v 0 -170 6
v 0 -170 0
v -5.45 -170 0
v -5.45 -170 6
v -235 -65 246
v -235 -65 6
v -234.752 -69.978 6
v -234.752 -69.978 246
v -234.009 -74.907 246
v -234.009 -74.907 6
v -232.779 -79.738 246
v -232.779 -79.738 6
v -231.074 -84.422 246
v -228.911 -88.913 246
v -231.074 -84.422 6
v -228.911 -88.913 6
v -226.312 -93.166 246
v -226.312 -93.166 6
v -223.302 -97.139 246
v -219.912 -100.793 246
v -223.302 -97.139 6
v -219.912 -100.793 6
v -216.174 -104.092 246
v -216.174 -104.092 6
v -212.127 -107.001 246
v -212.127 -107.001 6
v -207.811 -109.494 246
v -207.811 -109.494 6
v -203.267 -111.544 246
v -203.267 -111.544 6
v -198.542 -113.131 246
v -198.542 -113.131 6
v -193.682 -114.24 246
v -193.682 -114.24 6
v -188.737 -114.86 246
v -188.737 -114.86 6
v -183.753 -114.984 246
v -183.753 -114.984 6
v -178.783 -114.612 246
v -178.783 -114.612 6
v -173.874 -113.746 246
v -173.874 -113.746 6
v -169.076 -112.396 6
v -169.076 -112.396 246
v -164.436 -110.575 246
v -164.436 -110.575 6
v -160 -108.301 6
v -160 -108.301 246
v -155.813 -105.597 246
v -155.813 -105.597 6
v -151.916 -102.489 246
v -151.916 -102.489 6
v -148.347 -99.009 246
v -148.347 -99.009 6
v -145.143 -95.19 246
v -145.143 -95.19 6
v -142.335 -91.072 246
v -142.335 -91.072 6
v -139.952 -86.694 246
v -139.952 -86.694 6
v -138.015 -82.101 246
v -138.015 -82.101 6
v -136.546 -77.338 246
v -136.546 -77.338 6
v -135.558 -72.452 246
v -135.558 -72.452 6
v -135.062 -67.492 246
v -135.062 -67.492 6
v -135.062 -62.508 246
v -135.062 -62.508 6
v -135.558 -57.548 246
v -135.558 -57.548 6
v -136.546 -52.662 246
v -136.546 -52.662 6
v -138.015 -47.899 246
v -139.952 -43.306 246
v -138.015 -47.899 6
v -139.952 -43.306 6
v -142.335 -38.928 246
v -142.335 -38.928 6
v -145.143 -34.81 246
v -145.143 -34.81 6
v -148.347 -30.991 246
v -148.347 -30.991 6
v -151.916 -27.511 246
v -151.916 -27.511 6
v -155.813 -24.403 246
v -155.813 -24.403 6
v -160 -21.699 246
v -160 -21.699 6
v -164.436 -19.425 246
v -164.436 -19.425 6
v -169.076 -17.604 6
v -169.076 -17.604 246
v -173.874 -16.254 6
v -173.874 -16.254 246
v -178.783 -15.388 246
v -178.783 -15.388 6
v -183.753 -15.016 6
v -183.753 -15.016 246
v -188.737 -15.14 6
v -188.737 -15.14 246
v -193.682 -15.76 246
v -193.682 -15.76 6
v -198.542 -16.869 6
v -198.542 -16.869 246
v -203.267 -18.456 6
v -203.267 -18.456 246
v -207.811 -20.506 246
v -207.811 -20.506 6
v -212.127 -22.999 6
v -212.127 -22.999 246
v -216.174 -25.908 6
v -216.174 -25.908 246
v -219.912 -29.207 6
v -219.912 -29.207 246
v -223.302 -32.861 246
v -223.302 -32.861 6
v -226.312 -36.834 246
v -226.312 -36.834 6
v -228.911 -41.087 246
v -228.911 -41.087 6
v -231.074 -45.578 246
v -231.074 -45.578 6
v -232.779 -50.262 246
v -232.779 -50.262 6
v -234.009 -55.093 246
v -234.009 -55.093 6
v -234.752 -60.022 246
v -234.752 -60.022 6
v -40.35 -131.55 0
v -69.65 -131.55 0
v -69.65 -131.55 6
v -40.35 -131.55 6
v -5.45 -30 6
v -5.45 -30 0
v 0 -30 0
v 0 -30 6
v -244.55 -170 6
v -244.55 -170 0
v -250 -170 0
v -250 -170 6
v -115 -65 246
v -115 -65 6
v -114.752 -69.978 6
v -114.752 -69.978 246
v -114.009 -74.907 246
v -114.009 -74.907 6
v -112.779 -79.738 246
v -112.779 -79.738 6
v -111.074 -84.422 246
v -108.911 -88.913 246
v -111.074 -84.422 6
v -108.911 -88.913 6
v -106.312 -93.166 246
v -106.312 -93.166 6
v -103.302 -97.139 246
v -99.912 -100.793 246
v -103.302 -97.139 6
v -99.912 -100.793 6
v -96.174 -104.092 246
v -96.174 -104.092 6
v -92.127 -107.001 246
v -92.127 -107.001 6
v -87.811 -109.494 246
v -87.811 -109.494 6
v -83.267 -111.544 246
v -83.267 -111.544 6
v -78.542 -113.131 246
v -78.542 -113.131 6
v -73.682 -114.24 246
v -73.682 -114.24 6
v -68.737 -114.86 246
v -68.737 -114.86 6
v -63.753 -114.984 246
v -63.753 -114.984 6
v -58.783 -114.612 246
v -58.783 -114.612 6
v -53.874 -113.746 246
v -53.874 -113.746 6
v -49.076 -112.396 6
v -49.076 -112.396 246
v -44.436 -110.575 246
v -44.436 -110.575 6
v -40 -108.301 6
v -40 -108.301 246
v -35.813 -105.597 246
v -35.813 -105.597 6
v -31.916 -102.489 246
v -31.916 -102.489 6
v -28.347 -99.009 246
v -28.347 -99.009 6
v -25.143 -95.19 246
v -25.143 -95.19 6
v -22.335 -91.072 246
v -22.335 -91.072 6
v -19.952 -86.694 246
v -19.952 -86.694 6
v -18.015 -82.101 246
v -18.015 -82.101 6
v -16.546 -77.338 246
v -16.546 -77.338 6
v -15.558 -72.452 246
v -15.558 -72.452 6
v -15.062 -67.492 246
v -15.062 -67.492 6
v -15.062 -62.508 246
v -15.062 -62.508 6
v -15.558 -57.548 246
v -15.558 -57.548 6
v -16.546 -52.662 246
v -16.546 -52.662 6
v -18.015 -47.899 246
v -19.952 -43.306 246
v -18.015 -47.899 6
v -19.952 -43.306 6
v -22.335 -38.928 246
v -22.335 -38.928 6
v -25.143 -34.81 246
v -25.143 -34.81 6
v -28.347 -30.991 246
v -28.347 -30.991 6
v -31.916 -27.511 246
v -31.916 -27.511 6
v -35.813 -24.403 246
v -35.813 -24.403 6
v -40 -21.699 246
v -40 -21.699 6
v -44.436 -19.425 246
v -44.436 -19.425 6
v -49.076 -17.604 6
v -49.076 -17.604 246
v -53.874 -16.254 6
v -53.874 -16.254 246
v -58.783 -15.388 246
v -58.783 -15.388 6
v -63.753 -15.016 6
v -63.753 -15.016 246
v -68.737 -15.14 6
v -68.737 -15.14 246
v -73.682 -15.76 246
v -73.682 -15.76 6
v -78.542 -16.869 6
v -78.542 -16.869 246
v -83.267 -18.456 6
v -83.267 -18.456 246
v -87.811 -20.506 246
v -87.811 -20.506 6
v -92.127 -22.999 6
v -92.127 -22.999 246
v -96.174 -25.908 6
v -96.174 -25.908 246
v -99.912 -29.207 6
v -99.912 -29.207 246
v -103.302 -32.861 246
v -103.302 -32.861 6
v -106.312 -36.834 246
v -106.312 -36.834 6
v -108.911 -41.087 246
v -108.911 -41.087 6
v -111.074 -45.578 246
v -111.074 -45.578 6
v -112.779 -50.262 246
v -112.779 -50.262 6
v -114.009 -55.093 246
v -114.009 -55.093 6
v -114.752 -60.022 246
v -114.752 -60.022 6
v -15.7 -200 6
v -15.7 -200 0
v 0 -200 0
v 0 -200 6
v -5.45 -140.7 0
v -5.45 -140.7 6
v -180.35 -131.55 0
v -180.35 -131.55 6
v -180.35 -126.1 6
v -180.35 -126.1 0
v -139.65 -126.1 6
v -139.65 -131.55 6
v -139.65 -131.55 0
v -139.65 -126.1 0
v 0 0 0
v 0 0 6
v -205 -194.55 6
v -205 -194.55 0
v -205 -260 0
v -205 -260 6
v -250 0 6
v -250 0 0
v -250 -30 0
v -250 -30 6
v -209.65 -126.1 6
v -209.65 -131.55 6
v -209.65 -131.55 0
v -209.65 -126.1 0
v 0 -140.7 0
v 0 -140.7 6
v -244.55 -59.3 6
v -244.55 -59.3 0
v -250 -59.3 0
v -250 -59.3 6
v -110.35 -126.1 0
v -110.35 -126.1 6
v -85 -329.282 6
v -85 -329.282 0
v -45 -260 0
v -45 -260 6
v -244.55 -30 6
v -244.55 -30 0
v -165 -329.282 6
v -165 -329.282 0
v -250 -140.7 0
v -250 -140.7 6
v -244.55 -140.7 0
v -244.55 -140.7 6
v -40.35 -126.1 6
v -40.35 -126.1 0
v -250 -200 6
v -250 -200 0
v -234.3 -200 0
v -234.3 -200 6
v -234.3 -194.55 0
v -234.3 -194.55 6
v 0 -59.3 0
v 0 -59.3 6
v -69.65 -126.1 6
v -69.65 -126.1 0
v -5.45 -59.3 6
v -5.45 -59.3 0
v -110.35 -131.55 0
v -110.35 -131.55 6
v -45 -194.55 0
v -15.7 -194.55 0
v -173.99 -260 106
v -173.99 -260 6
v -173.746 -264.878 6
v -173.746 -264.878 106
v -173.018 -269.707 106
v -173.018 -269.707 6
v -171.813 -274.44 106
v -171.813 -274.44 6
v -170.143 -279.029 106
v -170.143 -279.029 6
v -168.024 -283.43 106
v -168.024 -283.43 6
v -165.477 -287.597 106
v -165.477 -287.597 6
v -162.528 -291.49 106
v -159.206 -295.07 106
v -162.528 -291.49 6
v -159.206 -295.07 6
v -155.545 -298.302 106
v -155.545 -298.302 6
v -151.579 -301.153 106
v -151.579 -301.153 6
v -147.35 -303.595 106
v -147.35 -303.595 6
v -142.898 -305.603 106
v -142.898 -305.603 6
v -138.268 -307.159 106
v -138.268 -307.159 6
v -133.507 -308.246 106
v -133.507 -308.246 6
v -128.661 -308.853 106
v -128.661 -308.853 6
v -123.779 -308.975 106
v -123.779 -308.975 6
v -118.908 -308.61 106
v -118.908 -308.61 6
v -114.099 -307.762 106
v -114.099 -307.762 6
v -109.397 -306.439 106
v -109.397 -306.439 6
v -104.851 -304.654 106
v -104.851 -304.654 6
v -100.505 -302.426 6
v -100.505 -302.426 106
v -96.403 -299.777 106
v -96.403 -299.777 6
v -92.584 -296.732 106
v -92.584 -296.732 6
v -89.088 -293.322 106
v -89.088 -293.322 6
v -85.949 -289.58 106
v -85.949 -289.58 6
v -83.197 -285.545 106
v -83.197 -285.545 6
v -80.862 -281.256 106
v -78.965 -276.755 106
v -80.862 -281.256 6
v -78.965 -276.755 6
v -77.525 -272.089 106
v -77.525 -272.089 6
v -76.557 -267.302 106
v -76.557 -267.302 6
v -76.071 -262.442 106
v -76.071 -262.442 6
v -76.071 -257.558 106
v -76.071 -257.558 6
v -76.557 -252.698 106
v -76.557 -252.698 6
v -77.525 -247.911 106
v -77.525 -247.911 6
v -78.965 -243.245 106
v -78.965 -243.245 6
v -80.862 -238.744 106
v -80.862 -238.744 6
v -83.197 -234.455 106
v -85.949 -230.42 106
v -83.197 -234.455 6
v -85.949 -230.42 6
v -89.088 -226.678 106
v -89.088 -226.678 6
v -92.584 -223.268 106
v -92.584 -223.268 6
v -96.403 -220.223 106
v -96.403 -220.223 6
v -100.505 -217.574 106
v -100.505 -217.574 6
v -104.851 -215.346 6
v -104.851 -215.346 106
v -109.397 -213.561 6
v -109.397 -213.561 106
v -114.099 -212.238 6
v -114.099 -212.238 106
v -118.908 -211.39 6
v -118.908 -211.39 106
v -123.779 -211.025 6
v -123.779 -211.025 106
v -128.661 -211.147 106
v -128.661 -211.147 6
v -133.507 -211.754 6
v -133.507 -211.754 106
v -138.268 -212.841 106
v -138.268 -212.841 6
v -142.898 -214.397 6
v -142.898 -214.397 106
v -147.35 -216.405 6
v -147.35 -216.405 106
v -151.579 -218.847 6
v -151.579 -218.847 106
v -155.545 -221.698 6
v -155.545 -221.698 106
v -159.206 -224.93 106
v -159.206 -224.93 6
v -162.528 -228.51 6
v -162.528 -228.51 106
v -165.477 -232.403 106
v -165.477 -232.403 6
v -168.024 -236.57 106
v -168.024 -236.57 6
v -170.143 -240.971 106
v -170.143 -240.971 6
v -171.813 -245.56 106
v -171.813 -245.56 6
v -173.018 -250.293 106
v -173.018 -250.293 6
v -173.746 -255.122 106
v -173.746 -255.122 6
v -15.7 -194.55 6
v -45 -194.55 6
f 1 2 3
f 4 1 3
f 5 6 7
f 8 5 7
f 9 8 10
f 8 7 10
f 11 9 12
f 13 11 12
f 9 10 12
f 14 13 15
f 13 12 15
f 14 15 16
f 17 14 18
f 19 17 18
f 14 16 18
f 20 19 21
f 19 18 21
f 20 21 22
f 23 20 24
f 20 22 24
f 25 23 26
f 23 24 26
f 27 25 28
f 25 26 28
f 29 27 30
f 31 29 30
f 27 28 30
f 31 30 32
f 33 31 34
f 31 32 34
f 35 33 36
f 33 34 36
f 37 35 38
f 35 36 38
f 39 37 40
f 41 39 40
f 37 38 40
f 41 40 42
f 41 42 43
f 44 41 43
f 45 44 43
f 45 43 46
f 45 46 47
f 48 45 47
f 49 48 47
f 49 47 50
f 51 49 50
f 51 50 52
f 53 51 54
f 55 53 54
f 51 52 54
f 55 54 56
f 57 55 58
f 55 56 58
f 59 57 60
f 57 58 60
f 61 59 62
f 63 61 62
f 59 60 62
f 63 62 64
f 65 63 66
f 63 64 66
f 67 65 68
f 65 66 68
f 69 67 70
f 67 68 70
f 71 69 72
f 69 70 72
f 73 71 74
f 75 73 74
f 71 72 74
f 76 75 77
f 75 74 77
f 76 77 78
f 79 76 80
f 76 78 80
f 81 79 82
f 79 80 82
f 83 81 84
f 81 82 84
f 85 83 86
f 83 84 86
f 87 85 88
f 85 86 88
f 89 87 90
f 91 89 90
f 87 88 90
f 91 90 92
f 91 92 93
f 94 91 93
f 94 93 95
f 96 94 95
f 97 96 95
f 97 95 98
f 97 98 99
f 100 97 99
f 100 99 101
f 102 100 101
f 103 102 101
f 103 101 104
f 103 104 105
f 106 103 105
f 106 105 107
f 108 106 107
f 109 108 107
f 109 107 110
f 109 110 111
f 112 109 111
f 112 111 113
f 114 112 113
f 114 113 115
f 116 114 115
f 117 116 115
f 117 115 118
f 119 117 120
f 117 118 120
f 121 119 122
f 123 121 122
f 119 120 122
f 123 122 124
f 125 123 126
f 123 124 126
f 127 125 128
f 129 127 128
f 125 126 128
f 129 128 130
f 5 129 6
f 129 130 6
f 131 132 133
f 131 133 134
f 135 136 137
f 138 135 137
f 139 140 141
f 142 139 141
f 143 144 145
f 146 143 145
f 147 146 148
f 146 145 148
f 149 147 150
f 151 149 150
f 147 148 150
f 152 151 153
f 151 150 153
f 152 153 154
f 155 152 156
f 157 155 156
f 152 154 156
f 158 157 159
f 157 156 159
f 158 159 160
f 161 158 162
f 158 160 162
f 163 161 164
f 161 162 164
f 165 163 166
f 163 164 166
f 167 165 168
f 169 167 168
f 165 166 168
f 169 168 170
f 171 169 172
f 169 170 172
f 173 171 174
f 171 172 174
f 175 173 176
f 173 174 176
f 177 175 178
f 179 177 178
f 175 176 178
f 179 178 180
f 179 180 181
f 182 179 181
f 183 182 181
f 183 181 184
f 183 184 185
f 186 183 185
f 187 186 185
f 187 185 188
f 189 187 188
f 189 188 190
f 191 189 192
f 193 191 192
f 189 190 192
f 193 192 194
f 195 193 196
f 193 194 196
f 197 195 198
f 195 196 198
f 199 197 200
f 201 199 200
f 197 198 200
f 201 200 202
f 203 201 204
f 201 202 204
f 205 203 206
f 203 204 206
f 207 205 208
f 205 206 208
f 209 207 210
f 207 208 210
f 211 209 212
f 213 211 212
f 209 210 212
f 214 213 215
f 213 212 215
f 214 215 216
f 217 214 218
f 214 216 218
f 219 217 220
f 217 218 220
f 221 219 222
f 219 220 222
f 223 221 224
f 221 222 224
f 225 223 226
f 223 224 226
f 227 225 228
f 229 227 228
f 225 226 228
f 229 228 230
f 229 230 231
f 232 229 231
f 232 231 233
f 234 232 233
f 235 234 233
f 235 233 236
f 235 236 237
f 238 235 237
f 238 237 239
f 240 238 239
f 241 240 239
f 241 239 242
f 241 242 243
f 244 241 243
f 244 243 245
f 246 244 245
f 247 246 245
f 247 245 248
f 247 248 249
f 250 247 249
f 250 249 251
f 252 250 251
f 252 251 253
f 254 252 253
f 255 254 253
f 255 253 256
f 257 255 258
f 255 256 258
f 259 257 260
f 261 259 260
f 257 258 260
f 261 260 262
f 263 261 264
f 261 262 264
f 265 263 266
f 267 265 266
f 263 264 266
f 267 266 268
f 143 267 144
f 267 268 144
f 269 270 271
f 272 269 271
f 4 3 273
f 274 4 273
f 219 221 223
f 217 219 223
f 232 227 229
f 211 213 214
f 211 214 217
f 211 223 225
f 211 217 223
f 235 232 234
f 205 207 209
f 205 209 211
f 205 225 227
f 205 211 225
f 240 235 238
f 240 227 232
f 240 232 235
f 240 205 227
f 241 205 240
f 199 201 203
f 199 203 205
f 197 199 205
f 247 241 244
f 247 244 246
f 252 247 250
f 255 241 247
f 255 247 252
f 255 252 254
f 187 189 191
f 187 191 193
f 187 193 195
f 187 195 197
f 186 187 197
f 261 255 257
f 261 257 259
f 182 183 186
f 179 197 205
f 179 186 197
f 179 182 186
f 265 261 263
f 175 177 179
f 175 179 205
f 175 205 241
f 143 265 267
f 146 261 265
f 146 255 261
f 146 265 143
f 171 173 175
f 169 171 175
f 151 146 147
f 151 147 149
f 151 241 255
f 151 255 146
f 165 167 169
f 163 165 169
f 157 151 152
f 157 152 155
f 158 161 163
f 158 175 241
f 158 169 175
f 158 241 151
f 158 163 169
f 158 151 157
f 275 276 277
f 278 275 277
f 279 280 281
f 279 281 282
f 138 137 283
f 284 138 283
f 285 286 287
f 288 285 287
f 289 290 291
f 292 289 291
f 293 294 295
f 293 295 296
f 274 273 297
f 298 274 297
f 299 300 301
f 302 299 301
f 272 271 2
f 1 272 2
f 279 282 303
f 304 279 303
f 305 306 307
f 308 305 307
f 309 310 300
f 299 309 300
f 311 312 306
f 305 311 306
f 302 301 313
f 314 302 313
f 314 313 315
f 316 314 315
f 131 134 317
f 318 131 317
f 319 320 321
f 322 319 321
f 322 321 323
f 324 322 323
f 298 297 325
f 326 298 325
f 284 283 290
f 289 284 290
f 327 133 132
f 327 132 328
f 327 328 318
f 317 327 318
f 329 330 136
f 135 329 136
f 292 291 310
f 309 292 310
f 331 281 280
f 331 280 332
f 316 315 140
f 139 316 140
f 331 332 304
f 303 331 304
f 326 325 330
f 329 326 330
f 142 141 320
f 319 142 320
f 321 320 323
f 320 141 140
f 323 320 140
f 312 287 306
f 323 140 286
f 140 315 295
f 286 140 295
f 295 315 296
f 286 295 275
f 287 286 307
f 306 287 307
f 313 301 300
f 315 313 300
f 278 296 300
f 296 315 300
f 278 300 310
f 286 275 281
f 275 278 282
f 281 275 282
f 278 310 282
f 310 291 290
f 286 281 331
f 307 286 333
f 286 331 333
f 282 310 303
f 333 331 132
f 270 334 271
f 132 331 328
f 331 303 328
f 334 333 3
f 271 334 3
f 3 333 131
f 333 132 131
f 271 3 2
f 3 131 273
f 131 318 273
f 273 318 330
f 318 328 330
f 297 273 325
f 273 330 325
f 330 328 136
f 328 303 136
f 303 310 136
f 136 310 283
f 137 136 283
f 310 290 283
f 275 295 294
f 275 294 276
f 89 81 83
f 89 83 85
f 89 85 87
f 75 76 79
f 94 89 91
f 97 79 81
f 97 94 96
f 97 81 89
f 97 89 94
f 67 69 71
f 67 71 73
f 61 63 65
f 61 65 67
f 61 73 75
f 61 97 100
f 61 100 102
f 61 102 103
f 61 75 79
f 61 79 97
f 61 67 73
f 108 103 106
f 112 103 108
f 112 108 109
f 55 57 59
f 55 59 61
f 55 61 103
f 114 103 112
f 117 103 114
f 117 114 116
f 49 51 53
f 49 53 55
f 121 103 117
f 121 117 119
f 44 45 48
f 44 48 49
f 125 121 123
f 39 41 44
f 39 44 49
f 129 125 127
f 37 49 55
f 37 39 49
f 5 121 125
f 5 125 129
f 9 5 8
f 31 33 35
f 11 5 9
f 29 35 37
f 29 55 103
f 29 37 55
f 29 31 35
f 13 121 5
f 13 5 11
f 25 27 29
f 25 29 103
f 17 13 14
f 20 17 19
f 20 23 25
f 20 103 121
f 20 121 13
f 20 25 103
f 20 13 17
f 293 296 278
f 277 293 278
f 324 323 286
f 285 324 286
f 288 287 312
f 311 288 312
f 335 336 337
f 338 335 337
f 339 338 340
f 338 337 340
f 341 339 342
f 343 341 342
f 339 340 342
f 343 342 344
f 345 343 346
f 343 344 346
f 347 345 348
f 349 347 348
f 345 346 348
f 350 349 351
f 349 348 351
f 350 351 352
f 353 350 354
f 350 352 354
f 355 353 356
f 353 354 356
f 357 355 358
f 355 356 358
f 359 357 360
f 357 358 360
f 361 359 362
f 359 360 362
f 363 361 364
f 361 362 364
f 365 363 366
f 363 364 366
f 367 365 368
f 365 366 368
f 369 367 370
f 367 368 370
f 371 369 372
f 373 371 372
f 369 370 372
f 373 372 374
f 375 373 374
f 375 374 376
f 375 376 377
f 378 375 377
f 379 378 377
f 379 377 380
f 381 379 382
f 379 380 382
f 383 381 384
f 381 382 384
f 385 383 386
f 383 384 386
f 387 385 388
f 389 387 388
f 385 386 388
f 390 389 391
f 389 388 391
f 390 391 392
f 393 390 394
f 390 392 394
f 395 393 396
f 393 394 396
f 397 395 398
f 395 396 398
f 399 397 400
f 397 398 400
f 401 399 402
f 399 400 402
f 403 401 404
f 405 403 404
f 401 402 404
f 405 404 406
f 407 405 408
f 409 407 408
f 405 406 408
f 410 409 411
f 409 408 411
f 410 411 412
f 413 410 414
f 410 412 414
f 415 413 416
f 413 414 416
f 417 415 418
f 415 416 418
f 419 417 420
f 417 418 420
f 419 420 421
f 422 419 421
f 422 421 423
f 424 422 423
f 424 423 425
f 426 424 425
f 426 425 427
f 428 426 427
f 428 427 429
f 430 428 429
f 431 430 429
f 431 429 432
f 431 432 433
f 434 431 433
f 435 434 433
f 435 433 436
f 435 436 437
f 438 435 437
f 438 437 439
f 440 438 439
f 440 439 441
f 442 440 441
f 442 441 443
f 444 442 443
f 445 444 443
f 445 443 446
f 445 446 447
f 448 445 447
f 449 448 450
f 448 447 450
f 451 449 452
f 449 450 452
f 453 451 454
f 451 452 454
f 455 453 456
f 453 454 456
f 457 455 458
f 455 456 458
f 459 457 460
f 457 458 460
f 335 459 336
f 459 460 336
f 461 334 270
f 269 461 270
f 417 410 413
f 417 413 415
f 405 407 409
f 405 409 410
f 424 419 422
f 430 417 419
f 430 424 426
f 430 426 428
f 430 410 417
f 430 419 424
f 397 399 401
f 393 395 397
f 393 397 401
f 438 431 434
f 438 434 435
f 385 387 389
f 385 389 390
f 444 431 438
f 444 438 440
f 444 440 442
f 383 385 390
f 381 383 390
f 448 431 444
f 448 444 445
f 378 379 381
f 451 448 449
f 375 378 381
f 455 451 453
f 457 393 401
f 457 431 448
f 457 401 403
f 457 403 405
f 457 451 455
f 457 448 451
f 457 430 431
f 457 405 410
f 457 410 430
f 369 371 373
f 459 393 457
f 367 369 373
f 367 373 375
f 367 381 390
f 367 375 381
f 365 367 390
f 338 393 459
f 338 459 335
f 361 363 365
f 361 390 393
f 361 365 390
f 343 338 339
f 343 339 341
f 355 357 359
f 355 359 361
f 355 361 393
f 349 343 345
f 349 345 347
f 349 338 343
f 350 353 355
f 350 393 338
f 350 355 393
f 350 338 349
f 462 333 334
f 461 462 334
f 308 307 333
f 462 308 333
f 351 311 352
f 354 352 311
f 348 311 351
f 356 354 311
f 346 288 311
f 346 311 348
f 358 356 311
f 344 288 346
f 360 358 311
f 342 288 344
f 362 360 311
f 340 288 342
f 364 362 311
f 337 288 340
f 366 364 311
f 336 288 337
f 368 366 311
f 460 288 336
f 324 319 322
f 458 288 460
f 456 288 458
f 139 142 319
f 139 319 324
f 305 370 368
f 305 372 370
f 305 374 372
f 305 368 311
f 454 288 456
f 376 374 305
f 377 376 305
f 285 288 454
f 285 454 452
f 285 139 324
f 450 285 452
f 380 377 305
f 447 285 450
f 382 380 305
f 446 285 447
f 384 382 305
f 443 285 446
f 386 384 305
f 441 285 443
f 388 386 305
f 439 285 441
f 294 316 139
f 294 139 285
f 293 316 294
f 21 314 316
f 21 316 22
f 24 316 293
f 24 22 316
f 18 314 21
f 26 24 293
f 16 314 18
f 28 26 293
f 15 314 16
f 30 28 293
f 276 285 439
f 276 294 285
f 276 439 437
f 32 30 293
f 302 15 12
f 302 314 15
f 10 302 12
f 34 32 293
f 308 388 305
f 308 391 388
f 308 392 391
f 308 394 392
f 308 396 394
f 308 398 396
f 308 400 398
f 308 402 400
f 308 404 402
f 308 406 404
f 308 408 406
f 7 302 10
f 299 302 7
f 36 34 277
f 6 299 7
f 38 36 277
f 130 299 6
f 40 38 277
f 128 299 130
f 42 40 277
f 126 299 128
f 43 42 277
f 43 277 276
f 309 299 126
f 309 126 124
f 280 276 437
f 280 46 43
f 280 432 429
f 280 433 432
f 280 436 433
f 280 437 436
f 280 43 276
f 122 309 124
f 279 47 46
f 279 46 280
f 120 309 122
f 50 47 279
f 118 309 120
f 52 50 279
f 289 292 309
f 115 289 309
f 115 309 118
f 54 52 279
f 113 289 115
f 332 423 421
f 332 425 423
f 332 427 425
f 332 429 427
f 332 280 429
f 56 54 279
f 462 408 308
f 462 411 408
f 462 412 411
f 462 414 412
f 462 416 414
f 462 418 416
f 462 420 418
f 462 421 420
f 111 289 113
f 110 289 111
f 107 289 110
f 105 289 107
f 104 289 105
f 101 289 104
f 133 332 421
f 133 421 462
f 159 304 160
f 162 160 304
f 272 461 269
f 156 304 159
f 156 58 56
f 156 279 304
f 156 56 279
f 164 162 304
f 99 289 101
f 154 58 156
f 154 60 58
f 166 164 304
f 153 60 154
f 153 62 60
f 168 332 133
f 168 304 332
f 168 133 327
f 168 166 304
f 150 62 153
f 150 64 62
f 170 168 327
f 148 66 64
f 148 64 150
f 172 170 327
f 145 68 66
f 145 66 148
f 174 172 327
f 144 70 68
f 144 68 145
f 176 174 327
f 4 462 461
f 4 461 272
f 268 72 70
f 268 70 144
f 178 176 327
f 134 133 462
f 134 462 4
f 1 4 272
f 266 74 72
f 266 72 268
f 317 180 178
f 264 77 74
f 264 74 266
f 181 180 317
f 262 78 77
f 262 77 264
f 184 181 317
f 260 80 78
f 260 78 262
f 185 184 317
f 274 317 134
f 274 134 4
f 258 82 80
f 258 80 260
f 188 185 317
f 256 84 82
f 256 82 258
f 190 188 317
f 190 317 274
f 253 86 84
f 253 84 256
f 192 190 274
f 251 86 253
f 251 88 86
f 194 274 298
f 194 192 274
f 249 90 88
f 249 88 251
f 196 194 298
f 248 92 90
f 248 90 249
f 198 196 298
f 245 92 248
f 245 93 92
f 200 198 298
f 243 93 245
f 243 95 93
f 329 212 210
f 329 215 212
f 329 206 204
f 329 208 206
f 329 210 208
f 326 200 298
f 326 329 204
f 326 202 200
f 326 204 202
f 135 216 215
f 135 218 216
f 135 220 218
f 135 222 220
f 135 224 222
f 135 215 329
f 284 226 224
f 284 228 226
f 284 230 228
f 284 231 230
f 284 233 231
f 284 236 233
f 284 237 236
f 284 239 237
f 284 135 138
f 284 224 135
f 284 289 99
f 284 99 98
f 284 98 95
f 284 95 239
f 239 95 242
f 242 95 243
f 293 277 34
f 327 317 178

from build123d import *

# Parameters (mm, degrees)
SKETCH_1_W      = 29.3
SKETCH_1_H      = 5.45
EXTRUDE_1_DEPTH = 6
SKETCH_2_R      = 48.989794856
EXTRUDE_2_DEPTH = 100
SKETCH_3_R      = 50
EXTRUDE_3_DEPTH = 240


with BuildPart() as part:
    # Эскиз1 → Бобышка-Вытянуть1 (new body)
    with BuildSketch(Plane.XY):
        Polygon((0, 0), (-250, 0), (-250, -30), (-244.55, -30), (-244.55, -59.3), (-250, -59.3), (-250, -140.7), (-244.55, -140.7), (-244.55, -170), (-250, -170), (-250, -200), (-234.3, -200), (-234.3, -194.55), (-205, -194.55), (-205, -260), (-165, -329.282032303), (-85, -329.282032303), (-45, -260), (-45, -194.55), (-15.7, -194.55), (-15.7, -200), (0, -200), (0, -170), (-5.45, -170), (-5.45, -140.7), (0, -140.7), (0, -59.3), (-5.45, -59.3), (-5.45, -30), (0, -30), align=None)
        with Locations((-55, -128.825)):
            Rectangle(SKETCH_1_W, SKETCH_1_H, mode=Mode.SUBTRACT)
        with Locations((-195, -128.825)):
            Rectangle(SKETCH_1_W, SKETCH_1_H, mode=Mode.SUBTRACT)
        with Locations((-125, -128.825)):
            Rectangle(SKETCH_1_W, SKETCH_1_H, mode=Mode.SUBTRACT)
    extrude(amount=EXTRUDE_1_DEPTH)

    # Эскиз2 → Бобышка-Вытянуть2 (add)
    with BuildSketch(Plane.XY.offset(6)):
        with Locations(Location((-125, -260, 0), (0, 0, 180))):
            Circle(SKETCH_2_R)
    extrude(amount=EXTRUDE_2_DEPTH)

    # Эскиз3 → Бобышка-Вытянуть3 (add)
    with BuildSketch(Plane.XY.offset(6)):
        with Locations(Location((-185, -65, 0), (0, 0, 180))):
            Circle(SKETCH_3_R)
        with Locations(Location((-65, -65, 0), (0, 0, 180))):
            Circle(SKETCH_3_R)
    extrude(amount=EXTRUDE_3_DEPTH)


solid = part.part
